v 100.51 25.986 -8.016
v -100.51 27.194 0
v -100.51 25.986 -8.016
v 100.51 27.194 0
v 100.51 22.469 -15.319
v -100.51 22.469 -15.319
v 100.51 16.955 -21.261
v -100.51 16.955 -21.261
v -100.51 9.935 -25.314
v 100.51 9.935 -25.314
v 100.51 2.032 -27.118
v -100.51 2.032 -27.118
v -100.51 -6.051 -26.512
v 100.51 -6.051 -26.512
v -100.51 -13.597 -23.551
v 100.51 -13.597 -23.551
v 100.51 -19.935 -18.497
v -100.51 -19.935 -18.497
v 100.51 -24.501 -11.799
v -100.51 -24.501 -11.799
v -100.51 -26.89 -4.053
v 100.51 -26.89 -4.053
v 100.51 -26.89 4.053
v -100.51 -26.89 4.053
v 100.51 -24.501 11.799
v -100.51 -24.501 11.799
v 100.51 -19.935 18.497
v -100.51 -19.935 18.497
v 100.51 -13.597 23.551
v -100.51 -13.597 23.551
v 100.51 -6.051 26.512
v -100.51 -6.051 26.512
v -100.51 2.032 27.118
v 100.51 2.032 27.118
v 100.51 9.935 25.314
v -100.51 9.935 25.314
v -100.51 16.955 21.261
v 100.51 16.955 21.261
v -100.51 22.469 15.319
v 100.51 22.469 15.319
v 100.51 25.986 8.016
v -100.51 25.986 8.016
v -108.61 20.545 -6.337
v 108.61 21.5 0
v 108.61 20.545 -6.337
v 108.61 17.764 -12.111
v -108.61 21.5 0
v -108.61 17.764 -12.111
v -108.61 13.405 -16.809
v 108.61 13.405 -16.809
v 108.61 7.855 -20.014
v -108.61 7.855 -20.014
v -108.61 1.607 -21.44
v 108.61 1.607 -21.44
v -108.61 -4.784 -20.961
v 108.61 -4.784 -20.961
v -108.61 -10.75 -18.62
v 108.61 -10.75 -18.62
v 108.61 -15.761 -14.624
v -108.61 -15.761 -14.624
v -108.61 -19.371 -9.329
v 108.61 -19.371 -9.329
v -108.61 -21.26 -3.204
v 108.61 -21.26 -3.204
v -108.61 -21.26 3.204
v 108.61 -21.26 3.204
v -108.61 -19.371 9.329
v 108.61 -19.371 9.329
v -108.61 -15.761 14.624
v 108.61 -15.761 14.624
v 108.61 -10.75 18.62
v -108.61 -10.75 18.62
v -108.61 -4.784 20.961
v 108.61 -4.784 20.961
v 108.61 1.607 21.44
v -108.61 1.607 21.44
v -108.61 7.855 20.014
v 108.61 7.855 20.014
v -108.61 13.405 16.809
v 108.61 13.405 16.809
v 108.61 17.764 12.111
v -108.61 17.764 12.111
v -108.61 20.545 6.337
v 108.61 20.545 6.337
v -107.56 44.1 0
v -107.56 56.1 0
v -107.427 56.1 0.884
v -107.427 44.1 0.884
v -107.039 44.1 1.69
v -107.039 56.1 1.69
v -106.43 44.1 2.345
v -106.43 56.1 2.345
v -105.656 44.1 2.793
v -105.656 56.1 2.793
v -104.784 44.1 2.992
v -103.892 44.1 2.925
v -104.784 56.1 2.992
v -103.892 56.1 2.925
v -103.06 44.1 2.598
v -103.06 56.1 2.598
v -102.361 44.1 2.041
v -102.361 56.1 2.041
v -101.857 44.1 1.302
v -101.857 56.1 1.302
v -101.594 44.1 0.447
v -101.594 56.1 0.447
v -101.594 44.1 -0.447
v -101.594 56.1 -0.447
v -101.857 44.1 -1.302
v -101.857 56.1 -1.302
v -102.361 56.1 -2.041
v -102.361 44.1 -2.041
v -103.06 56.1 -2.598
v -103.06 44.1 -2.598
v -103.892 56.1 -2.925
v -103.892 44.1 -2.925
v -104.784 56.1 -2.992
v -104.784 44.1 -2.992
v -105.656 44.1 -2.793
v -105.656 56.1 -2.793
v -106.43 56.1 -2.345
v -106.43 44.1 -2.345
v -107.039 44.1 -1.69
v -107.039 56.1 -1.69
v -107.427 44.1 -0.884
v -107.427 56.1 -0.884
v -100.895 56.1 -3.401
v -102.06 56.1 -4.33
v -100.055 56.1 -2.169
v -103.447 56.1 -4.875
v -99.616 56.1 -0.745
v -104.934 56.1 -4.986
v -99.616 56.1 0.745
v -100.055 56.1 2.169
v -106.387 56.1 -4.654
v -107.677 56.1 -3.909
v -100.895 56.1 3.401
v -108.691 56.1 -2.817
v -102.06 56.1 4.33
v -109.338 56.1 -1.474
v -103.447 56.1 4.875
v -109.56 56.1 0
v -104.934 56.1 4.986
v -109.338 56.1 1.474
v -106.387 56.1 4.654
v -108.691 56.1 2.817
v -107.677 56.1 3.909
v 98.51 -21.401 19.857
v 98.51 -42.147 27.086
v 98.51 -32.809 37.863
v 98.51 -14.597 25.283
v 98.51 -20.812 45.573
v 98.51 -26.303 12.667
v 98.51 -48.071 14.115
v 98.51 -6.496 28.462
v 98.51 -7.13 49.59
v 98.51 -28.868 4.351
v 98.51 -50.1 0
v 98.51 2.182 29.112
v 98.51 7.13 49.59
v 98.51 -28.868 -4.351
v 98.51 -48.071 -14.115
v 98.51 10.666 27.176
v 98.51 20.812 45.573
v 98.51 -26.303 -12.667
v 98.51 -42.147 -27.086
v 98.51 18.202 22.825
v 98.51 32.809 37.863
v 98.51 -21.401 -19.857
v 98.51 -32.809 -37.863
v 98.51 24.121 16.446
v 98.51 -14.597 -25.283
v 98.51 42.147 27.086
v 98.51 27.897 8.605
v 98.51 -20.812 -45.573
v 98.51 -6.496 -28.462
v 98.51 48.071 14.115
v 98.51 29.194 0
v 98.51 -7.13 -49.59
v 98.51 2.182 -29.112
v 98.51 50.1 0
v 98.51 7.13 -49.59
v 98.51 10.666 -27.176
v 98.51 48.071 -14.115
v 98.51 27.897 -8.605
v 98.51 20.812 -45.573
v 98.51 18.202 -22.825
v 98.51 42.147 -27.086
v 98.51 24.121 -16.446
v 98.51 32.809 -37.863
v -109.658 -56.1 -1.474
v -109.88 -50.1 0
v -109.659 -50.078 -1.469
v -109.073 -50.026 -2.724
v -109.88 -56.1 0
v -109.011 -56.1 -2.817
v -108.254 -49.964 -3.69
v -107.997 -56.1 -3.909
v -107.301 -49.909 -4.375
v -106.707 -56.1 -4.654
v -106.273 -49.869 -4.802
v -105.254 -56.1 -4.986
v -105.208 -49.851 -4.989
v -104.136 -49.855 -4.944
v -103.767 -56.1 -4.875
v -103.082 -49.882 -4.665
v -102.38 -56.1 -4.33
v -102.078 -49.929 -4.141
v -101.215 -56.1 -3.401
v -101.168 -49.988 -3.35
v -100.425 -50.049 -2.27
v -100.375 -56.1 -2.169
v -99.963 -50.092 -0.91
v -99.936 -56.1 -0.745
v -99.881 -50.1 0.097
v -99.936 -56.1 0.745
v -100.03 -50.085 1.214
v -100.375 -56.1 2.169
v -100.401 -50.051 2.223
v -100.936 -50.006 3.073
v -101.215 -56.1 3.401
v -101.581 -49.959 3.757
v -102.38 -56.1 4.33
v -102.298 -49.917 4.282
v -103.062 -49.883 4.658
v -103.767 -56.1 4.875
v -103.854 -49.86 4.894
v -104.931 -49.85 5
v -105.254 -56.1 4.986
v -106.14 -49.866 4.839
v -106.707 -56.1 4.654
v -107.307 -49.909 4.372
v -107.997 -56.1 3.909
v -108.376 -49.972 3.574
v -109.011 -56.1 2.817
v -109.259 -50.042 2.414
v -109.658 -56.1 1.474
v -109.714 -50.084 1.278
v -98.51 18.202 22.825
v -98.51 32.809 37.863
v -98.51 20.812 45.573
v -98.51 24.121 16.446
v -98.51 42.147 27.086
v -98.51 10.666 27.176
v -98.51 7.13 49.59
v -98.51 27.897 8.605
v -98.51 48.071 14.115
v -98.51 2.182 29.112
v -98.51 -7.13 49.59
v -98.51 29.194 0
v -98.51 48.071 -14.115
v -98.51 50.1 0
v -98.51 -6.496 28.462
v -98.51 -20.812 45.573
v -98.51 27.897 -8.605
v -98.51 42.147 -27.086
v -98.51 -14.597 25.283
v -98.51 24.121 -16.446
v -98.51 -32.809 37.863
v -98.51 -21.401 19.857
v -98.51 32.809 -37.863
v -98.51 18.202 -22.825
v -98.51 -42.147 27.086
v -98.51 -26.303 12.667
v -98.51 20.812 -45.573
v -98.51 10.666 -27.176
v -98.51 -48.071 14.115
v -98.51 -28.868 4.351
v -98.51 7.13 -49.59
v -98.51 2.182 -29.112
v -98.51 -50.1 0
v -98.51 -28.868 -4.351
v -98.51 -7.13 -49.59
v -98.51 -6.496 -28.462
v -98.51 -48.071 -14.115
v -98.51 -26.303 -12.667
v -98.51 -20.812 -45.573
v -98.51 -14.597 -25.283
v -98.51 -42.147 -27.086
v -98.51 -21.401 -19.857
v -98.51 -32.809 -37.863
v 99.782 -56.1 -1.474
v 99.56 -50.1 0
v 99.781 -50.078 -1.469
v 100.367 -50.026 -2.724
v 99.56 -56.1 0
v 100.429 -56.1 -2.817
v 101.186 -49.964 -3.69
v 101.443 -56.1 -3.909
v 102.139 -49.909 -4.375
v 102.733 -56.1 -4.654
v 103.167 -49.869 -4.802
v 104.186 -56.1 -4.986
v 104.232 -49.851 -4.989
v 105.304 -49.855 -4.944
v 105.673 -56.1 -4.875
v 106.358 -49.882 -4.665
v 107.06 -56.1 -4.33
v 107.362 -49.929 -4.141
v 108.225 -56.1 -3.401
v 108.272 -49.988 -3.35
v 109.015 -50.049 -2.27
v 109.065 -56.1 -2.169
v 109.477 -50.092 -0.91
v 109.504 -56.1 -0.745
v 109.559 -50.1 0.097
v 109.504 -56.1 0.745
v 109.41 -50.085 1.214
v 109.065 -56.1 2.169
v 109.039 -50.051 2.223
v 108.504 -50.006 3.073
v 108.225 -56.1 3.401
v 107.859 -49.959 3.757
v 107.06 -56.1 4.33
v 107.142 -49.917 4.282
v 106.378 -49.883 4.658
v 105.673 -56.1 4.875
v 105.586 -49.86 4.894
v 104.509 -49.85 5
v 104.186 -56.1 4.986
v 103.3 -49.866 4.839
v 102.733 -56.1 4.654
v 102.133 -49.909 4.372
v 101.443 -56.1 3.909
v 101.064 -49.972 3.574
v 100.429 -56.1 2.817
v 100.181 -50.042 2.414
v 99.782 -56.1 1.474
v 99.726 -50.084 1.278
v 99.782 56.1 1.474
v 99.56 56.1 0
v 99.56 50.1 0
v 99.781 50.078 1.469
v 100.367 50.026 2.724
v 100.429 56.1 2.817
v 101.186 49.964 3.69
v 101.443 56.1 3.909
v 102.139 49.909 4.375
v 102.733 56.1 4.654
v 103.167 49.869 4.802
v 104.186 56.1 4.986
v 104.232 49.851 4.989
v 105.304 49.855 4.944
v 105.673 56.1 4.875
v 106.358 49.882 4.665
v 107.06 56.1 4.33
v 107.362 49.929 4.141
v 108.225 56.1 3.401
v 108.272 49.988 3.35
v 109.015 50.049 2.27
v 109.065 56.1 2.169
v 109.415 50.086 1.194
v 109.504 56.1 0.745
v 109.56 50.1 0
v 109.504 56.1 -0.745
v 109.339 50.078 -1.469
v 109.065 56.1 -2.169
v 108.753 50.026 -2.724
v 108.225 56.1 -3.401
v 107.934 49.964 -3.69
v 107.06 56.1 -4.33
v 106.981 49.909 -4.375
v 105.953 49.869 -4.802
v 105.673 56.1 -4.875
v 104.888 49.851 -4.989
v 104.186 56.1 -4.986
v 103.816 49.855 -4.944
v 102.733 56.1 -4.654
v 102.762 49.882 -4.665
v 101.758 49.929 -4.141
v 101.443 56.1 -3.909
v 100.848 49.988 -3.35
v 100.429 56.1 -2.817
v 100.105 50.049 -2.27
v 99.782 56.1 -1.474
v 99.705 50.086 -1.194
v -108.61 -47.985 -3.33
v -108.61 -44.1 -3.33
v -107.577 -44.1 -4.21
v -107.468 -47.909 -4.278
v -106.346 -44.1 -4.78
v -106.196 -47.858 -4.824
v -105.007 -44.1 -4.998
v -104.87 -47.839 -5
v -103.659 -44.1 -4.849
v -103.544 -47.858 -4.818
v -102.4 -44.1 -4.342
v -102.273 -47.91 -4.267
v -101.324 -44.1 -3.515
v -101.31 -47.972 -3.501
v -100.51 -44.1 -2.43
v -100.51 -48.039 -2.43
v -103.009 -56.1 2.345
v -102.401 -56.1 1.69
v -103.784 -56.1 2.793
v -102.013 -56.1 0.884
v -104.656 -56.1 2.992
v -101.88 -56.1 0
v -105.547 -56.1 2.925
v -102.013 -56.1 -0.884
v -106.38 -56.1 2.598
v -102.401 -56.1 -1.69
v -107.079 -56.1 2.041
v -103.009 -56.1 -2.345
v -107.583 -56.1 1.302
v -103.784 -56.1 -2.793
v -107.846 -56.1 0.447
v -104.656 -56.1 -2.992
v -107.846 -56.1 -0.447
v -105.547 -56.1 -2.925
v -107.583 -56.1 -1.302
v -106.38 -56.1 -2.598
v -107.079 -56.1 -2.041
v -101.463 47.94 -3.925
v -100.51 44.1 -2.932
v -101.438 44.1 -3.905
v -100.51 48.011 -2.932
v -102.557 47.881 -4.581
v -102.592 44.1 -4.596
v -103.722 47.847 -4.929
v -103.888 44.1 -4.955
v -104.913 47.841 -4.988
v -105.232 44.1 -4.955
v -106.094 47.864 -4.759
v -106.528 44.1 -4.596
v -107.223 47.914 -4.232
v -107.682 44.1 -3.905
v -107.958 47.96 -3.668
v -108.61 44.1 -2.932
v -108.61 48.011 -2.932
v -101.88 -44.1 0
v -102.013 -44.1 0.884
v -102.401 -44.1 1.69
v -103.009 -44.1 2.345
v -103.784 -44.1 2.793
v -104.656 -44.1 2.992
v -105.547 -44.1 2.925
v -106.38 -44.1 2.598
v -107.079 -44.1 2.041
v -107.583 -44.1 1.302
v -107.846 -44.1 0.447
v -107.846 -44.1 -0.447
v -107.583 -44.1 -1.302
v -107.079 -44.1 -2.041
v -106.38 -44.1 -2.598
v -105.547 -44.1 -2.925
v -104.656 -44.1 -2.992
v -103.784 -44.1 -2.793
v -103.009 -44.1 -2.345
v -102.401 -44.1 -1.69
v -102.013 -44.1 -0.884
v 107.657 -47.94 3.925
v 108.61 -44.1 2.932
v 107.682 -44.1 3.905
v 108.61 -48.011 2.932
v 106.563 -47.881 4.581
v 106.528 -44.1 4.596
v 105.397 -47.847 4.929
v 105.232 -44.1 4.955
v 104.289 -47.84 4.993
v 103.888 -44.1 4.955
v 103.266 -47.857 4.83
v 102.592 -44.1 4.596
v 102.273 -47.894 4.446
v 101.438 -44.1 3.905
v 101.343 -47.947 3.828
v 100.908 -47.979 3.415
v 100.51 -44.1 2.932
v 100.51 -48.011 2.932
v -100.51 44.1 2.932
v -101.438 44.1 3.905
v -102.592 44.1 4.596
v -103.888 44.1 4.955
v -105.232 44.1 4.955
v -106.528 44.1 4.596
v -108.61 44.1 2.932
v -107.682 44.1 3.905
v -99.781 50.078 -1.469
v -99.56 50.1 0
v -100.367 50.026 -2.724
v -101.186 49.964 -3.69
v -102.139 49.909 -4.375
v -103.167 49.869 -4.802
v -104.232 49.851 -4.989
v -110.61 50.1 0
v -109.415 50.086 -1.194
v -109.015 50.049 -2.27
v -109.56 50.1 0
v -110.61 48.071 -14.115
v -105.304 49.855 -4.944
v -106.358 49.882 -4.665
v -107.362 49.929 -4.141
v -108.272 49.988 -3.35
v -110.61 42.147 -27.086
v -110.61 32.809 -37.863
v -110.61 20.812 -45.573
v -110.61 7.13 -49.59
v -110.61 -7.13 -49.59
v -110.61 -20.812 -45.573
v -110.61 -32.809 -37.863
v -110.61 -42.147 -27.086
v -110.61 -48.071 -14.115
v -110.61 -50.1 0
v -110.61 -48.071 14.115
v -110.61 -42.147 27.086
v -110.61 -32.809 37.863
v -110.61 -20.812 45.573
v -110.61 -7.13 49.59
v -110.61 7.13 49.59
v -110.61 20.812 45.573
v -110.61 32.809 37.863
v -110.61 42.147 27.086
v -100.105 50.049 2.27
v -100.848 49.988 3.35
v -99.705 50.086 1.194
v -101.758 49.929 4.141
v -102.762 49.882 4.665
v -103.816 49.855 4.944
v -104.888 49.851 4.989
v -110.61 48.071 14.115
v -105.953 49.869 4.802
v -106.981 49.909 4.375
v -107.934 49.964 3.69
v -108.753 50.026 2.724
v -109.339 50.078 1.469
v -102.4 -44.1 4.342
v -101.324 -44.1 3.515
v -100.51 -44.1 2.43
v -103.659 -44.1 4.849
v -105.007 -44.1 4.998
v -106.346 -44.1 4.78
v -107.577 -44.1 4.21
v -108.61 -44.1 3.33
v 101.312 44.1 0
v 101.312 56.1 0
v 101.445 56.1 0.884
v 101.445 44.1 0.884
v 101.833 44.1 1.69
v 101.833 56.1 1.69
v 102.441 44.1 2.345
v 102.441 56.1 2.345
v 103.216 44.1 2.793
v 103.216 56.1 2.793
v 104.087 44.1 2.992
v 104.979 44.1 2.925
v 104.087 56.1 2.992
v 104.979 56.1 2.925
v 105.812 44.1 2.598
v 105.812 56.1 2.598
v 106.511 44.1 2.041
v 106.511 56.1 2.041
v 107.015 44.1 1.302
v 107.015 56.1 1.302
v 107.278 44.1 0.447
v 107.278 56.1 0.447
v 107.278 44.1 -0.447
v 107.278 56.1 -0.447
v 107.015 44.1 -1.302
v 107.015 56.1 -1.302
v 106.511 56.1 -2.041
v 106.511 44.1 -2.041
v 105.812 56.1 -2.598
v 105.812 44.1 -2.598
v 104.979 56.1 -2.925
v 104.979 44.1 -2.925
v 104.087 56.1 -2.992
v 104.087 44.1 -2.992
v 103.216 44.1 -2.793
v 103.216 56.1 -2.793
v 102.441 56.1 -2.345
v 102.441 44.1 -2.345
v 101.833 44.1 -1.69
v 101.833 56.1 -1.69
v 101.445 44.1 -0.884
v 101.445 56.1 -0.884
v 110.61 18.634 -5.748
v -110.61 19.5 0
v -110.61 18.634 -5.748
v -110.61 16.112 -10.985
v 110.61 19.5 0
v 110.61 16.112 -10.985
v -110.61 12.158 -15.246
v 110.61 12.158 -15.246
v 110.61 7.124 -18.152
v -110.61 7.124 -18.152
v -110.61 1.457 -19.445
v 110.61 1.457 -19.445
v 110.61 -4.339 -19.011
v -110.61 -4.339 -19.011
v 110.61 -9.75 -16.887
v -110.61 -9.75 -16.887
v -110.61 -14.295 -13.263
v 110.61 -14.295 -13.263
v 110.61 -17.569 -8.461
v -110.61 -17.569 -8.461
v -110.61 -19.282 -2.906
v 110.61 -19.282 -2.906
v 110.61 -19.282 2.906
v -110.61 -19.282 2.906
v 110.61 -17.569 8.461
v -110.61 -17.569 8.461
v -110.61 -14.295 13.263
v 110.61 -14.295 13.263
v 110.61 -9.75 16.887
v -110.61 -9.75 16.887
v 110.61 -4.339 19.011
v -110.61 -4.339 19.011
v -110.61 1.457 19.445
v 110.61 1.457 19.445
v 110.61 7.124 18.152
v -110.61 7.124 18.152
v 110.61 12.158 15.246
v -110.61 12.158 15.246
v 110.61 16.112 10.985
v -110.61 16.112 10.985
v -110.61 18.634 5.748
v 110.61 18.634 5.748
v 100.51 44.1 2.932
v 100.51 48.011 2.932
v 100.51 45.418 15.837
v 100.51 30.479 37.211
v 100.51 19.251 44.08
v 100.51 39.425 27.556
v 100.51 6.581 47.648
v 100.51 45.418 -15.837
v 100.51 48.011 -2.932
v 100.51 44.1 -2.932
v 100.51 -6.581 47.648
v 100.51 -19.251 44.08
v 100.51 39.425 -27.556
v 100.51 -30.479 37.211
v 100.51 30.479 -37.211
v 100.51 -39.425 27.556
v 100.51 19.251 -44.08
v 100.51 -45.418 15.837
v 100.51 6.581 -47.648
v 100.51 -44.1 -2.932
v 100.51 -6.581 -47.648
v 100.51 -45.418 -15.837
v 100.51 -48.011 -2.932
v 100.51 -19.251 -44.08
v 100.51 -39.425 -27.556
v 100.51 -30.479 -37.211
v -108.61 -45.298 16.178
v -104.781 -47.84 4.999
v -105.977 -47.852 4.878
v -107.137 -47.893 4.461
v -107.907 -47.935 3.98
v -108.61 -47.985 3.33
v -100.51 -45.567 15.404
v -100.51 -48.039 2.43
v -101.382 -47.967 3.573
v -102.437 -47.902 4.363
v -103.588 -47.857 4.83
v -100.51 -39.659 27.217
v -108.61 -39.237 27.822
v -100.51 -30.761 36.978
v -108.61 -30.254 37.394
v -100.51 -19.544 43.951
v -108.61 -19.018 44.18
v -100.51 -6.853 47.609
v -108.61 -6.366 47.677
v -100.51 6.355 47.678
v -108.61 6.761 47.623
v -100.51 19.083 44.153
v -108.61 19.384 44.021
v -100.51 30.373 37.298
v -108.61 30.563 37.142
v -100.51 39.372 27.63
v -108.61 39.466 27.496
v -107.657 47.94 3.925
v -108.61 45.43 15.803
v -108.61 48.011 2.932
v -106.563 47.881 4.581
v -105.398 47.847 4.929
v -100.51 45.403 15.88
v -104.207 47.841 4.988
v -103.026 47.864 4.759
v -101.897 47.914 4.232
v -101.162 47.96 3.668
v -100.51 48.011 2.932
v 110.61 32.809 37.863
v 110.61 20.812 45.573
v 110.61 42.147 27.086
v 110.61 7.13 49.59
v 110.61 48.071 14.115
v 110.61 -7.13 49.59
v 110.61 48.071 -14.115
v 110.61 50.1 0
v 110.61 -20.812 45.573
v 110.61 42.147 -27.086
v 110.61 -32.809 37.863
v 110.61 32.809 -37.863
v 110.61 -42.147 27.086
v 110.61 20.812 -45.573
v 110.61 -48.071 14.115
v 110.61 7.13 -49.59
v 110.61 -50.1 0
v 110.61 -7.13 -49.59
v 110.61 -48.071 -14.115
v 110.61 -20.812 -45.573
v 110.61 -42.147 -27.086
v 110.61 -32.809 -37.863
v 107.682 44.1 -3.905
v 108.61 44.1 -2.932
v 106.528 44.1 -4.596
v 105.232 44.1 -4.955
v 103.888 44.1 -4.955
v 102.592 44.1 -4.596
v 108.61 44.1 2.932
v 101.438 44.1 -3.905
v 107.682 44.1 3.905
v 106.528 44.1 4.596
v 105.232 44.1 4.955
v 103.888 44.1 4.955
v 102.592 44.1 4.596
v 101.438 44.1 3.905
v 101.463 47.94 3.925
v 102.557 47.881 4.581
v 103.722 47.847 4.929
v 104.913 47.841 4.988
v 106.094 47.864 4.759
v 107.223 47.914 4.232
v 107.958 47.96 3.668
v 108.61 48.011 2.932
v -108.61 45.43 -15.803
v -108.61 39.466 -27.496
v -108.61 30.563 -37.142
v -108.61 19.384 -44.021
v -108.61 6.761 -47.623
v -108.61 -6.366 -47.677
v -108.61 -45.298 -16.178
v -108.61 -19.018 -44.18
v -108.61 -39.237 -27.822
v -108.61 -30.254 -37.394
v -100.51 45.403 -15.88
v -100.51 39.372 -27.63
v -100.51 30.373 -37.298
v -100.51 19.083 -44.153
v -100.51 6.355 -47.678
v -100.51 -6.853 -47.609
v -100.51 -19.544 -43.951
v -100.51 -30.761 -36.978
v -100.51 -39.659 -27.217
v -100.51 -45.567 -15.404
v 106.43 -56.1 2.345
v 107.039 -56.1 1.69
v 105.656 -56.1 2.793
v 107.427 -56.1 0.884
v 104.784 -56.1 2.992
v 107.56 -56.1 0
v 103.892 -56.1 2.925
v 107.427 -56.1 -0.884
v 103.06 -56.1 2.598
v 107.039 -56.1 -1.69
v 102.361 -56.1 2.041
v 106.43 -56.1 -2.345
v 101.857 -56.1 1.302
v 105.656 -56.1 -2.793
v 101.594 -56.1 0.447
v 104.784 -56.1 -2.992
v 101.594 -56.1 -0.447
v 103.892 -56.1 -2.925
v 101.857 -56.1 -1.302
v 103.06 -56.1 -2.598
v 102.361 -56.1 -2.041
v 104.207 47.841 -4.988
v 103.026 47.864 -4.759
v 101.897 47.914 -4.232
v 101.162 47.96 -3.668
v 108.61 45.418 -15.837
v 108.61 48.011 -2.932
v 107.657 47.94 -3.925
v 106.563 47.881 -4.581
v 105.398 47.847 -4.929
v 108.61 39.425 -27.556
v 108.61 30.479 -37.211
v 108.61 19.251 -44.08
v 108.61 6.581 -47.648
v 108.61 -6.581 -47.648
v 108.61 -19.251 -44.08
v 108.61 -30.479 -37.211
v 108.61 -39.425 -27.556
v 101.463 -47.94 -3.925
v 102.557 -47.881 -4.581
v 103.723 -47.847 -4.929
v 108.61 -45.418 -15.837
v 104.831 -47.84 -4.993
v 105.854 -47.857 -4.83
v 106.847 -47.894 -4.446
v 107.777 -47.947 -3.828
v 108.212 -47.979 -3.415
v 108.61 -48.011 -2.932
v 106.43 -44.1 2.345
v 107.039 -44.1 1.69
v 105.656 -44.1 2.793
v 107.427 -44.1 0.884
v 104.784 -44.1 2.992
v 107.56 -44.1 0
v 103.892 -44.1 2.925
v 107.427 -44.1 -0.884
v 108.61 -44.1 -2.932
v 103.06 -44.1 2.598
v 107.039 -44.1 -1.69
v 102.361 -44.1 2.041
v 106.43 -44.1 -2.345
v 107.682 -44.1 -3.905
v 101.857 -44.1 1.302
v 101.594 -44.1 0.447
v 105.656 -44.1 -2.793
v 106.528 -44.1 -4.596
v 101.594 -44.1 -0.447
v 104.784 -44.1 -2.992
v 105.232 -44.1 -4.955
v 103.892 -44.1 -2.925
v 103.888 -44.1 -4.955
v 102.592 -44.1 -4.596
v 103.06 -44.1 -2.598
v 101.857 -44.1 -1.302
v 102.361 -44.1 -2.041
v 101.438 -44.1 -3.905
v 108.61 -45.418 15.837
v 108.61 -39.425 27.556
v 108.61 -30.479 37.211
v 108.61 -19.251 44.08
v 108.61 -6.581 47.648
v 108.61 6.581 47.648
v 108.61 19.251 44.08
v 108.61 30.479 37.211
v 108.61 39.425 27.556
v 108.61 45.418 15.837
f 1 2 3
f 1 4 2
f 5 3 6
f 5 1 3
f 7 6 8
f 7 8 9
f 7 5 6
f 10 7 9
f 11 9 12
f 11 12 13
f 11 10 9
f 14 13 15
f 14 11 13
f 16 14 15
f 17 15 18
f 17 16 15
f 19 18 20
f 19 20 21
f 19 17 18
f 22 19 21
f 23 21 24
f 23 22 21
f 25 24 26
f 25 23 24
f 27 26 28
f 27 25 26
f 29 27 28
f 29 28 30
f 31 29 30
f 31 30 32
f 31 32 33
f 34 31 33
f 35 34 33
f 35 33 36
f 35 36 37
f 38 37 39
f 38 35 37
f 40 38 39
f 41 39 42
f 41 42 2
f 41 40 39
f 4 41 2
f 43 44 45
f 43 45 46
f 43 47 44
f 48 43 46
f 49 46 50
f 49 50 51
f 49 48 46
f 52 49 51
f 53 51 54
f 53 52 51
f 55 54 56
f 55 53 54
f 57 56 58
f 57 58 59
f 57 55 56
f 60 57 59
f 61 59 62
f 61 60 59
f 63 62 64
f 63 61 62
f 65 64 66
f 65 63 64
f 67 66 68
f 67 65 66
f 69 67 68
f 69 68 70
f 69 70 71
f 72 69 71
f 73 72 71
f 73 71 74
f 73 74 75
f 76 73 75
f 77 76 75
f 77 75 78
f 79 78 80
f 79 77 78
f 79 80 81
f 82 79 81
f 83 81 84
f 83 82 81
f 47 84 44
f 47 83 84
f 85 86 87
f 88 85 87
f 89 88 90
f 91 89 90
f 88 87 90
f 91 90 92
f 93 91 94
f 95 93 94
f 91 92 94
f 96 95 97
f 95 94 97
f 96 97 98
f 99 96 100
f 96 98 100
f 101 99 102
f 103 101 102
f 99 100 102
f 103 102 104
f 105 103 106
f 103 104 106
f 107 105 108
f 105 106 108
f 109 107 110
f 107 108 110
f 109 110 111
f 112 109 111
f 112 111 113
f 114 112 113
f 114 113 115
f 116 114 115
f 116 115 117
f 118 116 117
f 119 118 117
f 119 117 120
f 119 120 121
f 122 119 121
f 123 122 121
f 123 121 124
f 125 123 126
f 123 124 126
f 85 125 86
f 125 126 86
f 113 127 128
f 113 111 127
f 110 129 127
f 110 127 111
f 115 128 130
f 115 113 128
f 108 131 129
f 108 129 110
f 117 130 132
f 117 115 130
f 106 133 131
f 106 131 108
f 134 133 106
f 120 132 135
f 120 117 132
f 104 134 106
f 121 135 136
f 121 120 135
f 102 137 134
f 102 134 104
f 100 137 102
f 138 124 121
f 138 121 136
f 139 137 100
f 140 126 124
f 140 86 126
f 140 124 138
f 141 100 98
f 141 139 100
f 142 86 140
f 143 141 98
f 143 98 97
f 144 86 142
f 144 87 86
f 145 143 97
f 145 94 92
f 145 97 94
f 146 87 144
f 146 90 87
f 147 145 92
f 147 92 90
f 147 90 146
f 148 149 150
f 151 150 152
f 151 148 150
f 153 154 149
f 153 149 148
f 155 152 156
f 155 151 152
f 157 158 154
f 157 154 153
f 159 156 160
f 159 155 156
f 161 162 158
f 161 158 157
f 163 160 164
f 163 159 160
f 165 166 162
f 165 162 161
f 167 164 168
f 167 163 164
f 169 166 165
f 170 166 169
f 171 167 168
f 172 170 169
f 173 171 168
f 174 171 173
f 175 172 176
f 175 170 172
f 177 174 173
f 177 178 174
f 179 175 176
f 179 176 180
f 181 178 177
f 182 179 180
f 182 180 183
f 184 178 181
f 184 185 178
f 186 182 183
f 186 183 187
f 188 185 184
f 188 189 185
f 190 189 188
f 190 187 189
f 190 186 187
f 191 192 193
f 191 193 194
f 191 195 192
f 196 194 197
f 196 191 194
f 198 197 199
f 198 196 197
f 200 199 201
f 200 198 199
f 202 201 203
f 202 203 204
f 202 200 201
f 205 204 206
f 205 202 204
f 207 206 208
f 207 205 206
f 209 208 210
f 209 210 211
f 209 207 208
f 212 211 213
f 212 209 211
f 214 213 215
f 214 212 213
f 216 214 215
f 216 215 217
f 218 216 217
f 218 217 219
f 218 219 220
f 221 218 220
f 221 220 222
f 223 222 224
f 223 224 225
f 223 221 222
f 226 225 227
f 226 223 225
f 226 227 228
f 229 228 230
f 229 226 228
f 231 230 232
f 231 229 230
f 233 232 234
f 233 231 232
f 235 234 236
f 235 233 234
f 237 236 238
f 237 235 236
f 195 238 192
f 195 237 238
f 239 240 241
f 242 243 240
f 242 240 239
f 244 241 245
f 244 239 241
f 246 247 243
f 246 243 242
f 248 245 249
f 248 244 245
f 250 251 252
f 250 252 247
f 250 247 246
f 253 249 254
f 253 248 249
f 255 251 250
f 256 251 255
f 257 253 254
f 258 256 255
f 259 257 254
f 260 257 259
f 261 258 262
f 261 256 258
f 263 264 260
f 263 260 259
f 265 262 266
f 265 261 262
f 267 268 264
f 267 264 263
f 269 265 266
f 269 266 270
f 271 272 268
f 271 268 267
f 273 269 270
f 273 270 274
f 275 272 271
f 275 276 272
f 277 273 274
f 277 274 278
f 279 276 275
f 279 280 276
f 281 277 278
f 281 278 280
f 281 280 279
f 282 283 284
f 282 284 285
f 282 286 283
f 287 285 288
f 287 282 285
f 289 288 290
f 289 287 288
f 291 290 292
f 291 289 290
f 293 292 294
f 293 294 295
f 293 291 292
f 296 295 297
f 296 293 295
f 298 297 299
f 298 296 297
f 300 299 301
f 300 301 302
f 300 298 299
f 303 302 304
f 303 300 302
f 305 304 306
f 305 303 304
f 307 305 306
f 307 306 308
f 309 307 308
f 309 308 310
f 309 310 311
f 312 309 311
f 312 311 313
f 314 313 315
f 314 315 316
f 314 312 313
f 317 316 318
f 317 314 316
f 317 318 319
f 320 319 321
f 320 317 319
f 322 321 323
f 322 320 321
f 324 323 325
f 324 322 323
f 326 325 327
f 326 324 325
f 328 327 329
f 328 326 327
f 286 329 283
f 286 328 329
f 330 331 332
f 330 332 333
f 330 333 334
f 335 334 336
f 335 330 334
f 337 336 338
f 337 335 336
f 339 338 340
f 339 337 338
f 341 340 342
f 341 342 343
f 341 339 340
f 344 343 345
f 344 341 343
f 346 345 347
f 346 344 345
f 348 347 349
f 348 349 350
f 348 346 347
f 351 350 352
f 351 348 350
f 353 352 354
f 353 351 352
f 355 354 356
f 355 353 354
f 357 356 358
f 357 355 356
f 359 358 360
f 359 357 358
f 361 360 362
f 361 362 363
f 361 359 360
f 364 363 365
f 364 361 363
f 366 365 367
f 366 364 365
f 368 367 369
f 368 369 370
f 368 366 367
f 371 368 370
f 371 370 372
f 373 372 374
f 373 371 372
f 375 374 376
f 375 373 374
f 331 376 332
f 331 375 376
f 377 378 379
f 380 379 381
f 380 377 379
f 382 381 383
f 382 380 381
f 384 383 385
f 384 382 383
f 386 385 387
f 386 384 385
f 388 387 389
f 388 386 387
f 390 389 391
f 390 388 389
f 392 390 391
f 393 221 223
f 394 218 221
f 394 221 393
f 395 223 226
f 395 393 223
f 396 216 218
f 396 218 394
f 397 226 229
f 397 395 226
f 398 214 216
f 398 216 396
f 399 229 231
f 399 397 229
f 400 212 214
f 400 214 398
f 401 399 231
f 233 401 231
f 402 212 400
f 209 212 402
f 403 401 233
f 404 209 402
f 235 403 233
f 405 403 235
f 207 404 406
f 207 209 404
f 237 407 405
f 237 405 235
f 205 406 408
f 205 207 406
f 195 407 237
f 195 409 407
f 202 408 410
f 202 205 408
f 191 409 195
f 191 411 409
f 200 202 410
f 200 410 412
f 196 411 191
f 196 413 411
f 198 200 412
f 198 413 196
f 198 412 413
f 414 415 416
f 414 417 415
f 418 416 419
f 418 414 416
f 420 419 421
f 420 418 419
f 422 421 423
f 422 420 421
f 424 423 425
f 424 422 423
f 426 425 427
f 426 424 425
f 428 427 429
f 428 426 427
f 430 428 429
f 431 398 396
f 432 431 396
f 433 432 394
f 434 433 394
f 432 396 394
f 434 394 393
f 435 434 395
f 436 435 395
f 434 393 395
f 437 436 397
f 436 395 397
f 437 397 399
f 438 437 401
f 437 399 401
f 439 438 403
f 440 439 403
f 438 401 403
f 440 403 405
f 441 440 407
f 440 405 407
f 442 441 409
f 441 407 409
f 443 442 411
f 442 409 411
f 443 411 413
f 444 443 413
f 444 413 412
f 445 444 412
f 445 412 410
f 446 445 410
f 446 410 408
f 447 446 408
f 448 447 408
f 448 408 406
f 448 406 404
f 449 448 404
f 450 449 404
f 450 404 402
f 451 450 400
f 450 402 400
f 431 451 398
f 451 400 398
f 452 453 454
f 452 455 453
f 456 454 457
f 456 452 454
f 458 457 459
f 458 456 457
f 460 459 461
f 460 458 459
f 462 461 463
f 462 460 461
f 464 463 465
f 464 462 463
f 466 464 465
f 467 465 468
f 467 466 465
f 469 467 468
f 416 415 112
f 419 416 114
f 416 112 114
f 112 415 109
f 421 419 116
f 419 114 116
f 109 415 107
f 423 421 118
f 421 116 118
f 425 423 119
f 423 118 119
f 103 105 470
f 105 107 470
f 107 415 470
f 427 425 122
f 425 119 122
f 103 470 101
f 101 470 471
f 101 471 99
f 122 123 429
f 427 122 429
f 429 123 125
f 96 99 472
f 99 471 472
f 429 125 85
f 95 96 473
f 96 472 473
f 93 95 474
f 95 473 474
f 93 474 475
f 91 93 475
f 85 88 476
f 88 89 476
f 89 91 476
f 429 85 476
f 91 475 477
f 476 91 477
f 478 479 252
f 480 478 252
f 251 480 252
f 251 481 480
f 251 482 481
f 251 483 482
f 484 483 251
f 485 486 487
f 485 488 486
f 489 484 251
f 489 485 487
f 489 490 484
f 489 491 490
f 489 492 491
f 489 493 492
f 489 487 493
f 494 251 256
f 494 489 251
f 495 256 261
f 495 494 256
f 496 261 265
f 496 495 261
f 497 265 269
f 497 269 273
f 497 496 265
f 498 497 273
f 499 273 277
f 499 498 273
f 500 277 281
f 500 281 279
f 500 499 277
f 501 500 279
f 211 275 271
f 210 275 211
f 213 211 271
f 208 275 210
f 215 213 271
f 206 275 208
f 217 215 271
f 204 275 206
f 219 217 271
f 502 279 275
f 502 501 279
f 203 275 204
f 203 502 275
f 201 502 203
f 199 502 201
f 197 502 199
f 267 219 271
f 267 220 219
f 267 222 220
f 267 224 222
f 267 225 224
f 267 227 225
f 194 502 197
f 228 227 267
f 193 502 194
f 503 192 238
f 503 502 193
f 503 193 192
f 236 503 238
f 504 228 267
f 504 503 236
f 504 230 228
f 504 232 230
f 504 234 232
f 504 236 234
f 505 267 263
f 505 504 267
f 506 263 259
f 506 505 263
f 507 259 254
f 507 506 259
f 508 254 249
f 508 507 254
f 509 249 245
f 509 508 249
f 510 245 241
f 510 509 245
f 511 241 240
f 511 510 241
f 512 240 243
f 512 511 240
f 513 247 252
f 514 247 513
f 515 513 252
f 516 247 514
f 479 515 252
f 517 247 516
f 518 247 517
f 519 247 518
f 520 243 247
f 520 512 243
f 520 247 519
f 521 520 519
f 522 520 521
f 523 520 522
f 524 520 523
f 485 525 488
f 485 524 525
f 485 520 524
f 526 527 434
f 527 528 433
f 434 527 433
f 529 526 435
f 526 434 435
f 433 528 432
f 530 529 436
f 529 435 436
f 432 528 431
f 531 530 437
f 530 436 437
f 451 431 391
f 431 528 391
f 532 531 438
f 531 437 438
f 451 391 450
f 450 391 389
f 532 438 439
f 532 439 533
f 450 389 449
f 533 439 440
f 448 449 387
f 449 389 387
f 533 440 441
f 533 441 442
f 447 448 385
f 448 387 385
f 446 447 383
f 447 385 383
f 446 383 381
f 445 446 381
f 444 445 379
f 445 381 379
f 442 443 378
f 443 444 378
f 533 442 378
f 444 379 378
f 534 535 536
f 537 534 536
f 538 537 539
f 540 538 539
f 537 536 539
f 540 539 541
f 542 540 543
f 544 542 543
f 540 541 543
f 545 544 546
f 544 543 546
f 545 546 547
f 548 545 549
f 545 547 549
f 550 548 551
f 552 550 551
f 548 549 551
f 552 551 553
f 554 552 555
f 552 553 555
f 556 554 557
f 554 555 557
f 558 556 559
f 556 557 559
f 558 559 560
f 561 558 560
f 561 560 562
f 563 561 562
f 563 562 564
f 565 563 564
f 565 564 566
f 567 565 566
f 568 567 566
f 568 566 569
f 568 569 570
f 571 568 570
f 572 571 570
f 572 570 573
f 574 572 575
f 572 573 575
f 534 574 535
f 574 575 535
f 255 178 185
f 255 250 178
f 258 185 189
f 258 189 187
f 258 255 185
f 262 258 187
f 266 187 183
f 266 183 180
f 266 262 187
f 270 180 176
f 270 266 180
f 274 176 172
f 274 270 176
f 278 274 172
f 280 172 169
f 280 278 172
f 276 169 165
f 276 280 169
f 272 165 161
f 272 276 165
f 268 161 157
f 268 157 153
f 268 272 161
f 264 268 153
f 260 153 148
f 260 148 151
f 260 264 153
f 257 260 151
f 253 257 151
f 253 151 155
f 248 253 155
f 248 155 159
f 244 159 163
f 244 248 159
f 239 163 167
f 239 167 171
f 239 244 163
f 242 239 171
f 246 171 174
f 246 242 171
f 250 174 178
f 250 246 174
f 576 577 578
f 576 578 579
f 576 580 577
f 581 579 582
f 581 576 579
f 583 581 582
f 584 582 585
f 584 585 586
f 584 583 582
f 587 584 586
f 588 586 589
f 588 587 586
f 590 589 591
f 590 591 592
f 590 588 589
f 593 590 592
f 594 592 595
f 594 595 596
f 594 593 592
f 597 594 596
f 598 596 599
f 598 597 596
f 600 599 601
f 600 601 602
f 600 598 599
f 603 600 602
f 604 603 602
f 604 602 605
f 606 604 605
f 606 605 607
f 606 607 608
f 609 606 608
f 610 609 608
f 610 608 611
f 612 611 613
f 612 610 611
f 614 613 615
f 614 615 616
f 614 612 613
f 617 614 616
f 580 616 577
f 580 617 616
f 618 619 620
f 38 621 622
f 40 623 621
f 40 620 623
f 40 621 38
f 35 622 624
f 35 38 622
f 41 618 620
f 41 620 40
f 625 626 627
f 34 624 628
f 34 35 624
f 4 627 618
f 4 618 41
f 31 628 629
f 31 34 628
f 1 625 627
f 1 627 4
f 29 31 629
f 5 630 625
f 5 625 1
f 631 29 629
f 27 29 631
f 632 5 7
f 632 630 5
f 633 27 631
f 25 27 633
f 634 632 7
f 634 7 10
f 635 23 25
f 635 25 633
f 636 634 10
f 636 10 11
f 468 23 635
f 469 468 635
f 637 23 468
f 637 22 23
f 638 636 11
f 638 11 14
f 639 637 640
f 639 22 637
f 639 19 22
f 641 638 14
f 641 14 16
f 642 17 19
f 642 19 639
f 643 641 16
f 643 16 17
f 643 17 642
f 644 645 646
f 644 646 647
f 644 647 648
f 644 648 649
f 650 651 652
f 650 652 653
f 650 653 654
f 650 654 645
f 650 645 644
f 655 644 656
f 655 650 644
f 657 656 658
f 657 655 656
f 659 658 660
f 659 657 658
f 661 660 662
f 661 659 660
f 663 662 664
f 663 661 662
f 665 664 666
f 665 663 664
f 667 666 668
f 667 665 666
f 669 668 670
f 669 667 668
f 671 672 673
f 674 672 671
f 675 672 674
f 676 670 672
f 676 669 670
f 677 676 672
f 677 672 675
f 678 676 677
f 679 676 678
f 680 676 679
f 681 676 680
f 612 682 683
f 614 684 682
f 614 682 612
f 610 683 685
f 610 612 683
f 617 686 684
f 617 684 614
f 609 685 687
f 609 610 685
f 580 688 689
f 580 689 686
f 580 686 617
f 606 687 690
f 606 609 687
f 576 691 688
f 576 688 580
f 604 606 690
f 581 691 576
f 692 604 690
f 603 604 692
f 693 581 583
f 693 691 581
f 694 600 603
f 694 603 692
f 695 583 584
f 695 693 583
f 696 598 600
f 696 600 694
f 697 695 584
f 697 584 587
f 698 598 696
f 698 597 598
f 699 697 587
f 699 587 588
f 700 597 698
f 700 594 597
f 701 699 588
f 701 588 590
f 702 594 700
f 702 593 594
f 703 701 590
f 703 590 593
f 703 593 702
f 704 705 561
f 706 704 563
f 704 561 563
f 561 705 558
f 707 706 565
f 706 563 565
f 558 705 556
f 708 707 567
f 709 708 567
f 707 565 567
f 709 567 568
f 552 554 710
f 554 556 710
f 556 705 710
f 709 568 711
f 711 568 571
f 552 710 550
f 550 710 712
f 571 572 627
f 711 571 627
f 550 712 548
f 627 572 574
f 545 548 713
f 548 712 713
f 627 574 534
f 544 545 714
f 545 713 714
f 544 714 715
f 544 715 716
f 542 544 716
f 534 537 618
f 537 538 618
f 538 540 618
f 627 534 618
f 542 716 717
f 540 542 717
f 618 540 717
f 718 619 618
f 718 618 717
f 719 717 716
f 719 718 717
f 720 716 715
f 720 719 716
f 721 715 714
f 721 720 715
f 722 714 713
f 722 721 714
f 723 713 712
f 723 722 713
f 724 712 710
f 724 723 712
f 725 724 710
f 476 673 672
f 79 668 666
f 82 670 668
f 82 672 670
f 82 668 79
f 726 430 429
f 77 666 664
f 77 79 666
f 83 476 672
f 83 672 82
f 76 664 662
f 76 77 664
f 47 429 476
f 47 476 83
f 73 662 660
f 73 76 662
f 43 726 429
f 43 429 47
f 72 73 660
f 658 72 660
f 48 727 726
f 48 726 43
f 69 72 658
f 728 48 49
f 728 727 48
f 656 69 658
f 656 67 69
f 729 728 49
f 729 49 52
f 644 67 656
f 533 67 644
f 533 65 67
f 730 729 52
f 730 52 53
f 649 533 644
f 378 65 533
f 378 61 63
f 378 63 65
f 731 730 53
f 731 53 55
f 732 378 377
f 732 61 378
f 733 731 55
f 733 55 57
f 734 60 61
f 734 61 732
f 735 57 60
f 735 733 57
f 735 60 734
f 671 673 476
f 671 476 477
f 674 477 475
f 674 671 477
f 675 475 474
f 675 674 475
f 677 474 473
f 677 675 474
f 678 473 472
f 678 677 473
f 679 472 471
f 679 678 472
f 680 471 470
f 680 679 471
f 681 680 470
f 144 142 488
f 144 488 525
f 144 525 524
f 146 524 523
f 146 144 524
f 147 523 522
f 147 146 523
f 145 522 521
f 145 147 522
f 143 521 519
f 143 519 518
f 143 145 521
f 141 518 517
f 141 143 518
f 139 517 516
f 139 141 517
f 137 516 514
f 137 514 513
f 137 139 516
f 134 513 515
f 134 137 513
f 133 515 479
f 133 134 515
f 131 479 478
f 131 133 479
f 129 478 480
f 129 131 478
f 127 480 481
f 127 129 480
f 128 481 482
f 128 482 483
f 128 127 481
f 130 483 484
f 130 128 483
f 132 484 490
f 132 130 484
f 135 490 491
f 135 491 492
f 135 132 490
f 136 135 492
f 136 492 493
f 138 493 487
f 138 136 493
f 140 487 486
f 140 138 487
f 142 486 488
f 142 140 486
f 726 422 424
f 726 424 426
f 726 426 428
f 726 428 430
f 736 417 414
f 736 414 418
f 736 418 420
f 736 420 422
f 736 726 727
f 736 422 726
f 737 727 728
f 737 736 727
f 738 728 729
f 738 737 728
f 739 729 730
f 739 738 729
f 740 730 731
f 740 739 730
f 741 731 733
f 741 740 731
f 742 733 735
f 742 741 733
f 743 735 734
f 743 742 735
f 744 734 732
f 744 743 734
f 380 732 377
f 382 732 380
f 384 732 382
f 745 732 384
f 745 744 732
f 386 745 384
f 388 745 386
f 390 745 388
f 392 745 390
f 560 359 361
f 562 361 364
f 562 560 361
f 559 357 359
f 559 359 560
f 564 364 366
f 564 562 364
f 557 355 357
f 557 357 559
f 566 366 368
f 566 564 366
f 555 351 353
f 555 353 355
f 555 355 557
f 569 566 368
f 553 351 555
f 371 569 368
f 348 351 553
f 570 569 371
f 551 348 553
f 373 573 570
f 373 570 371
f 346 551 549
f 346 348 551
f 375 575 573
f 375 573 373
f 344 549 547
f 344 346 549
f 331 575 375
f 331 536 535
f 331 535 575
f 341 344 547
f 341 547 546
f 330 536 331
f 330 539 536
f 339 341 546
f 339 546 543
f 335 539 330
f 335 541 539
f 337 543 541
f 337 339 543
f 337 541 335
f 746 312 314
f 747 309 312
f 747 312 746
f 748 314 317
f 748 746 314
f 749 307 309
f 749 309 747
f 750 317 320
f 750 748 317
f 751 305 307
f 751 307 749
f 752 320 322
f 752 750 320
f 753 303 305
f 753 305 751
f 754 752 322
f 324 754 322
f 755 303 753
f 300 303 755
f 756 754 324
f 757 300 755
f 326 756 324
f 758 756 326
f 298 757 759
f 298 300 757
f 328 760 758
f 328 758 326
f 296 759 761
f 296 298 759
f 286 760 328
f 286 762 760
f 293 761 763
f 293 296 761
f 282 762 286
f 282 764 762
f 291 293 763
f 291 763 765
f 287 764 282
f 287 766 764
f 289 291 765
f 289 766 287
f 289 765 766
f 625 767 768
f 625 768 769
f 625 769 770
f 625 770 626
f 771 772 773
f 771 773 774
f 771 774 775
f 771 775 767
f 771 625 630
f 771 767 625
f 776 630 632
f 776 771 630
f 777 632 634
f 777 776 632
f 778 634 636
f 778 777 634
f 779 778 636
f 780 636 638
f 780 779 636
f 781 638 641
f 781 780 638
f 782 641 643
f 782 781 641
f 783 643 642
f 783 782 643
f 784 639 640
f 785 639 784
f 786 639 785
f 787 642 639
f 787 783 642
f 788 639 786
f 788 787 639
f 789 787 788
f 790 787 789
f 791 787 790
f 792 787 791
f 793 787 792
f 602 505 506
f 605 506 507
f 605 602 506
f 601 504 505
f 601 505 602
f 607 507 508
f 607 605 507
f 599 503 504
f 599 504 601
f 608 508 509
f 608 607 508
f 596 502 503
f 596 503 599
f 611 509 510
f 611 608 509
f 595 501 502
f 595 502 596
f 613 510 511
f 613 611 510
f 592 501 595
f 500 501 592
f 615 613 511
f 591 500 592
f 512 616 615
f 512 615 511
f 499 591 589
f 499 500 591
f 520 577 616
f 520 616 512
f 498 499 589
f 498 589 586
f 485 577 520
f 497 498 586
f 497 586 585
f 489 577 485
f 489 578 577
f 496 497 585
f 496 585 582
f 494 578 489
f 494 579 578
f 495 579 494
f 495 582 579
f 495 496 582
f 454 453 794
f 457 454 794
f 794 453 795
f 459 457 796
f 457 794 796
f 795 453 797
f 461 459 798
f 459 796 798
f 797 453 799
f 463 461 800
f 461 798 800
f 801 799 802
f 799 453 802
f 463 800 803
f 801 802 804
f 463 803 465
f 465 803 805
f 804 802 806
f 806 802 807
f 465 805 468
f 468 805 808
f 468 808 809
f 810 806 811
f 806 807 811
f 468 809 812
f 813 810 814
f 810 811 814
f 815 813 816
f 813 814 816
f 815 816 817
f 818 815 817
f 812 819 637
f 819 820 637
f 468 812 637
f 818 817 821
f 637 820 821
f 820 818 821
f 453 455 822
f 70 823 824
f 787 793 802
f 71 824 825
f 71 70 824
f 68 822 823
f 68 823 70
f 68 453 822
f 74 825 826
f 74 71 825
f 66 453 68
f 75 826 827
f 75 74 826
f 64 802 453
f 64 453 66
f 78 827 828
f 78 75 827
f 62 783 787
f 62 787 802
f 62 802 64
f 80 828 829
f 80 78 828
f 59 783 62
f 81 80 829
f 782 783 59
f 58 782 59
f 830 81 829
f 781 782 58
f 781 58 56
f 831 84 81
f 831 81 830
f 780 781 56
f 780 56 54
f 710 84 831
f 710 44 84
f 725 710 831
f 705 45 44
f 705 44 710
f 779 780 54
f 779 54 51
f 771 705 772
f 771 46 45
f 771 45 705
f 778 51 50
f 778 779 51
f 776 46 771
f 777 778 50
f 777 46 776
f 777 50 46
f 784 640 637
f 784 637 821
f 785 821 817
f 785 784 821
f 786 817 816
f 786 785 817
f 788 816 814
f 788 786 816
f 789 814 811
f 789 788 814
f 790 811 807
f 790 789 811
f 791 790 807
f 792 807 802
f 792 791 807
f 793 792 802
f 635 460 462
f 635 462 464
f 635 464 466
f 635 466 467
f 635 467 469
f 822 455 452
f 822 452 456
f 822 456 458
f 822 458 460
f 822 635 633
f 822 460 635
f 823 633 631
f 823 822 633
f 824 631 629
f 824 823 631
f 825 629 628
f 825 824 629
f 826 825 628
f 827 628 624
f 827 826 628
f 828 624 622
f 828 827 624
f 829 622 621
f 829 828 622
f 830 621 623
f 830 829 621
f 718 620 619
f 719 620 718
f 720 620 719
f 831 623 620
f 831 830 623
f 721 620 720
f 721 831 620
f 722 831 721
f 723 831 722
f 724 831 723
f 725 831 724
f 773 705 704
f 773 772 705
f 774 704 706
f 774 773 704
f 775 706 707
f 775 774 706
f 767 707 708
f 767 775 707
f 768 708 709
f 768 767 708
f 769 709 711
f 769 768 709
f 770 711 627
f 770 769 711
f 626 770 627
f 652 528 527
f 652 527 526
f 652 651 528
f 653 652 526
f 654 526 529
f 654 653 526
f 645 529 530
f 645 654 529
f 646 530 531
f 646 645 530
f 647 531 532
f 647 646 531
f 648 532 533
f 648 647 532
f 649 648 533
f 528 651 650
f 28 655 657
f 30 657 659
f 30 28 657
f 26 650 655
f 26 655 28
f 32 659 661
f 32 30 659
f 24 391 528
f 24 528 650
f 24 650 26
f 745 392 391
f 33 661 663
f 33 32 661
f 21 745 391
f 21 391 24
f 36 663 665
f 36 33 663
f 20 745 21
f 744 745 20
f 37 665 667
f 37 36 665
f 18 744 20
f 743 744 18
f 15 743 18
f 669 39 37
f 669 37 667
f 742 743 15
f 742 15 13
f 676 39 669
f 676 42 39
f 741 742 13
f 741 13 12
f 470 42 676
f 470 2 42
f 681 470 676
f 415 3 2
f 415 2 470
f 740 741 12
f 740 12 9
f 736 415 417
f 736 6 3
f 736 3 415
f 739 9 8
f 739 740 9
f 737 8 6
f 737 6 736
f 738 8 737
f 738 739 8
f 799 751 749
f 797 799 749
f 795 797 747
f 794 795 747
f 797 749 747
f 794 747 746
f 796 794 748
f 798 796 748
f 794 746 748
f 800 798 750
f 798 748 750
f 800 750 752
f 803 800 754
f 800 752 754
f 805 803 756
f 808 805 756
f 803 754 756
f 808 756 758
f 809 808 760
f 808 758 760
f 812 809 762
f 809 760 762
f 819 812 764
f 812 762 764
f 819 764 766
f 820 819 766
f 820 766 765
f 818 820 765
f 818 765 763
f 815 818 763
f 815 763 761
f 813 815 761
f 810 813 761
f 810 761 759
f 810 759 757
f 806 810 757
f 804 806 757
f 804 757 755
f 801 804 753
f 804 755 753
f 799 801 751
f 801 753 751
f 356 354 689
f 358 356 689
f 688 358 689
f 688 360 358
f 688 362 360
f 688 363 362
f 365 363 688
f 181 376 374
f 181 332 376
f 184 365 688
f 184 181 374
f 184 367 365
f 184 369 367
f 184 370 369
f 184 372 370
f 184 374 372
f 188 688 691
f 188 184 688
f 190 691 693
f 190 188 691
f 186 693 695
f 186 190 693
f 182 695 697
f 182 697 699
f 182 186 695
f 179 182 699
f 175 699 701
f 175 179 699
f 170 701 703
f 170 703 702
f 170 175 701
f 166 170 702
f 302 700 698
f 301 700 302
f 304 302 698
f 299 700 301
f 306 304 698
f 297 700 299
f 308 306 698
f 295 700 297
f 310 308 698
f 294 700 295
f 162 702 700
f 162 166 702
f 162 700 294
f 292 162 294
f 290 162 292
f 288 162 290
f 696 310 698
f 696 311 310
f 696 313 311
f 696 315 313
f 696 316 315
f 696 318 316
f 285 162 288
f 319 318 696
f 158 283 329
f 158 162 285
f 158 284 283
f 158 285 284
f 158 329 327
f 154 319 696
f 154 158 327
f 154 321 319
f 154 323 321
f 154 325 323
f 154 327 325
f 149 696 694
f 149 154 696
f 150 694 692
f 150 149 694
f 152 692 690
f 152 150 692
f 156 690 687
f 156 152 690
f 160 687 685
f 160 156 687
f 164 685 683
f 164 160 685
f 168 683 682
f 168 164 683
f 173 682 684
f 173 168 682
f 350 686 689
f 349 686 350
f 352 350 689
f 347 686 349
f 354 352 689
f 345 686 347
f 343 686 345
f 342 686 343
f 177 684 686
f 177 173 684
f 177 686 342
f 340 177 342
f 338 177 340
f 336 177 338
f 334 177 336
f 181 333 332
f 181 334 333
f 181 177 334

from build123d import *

# Parameters (mm, degrees)
CROQUIS3_R              = 5
SALIENTE_EXTRUIR1_DEPTH = 6
CROQUIS4_R              = 3
CORTAR_EXTRUIR1_DEPTH   = 12
CROQUIS5_R              = 5
SALIENTE_EXTRUIR2_DEPTH = 6
CROQUIS6_R              = 3
CORTAR_EXTRUIR2_DEPTH   = 12
CROQUIS8_R              = 5
SALIENTE_EXTRUIR4_DEPTH = 6
CROQUIS9_R              = 3
CORTAR_EXTRUIR4_DEPTH   = 12
CROQUIS10_R             = 5
SALIENTE_EXTRUIR5_DEPTH = 6
CROQUIS11_R             = 3
CORTAR_EXTRUIR5_DEPTH   = 12


with BuildPart() as part:
    # Camisa → Revolución3 (revolve)
    with BuildSketch(Plane.XY):
        Polygon((-110.61, 19.5), (110.61, 19.5), (110.61, 50.1), (98.51, 50.1), (98.51, 29.193885615), (-98.51, 29.193885615), (-98.51, 50.1), (-110.61, 50.1), align=None)
        Polygon((100.51, 48.1), (108.61, 48.1), (108.61, 21.5), (-108.61, 21.5), (-108.61, 48.1), (-100.51, 48.1), (-100.51, 27.193885615), (100.51, 27.193885615), align=None, mode=Mode.SUBTRACT)
    revolve(axis=Axis((125, 0, 0), (-1, 0, 0)))

    # Croquis3 → Saliente-Extruir1 (add, symmetric)
    with BuildSketch(Plane(origin=(0, 50.1, 0), x_dir=(1, 0, 0), z_dir=(0, 1, 0))):
        with Locations(Location((-104.56, 0, 0), (0, 0, 180))):
            Circle(CROQUIS3_R)
    extrude(amount=SALIENTE_EXTRUIR1_DEPTH, both=True)

    # Croquis4 → Cortar-Extruir1 (cut)
    with BuildSketch(Plane(origin=(0, 56.1, 0), x_dir=(1, 0, 0), z_dir=(0, 1, 0))):
        with Locations(Location((-104.56, 0, 0), (0, 0, 180))):
            Circle(CROQUIS4_R)
    extrude(amount=-CORTAR_EXTRUIR1_DEPTH, mode=Mode.SUBTRACT)

    # Croquis5 → Saliente-Extruir2 (add, symmetric)
    with BuildSketch(Plane(origin=(0, 50.1, 0), x_dir=(1, 0, 0), z_dir=(0, 1, 0))):
        with Locations(Location((104.56, 0, 0), (0, 0, 180))):
            Circle(CROQUIS5_R)
    extrude(amount=SALIENTE_EXTRUIR2_DEPTH, both=True)

    # Croquis6 → Cortar-Extruir2 (cut)
    with BuildSketch(Plane(origin=(0, 56.1, 0), x_dir=(1, 0, 0), z_dir=(0, 1, 0))):
        with Locations(Location((104.311648401, 0, 0), (0, 0, 180))):
            Circle(CROQUIS6_R)
    extrude(amount=-CORTAR_EXTRUIR2_DEPTH, mode=Mode.SUBTRACT)

    # Croquis8 → Saliente-Extruir4 (add, symmetric)
    with BuildSketch(Plane(origin=(0, -50.1, 0), x_dir=(-1, 0, 0), z_dir=(0, -1, 0))):
        with Locations((104.879923699, 0)):
            Circle(CROQUIS8_R)
    extrude(amount=SALIENTE_EXTRUIR4_DEPTH, both=True)

    # Croquis9 → Cortar-Extruir4 (cut)
    with BuildSketch(Plane.XZ.offset(56.1)):
        with Locations((-104.879923699, 0)):
            Circle(CROQUIS9_R)
    extrude(amount=-CORTAR_EXTRUIR4_DEPTH, mode=Mode.SUBTRACT)

    # Croquis10 → Saliente-Extruir5 (add, symmetric)
    with BuildSketch(Plane(origin=(0, -50.1, 0), x_dir=(-1, 0, 0), z_dir=(0, -1, 0))):
        with Locations((-104.56, 0)):
            Circle(CROQUIS10_R)
    extrude(amount=SALIENTE_EXTRUIR5_DEPTH, both=True)

    # Croquis11 → Cortar-Extruir5 (cut)
    with BuildSketch(Plane.XZ.offset(56.1)):
        with Locations((104.56, 0)):
            Circle(CROQUIS11_R)
    extrude(amount=-CORTAR_EXTRUIR5_DEPTH, mode=Mode.SUBTRACT)


solid = part.part
